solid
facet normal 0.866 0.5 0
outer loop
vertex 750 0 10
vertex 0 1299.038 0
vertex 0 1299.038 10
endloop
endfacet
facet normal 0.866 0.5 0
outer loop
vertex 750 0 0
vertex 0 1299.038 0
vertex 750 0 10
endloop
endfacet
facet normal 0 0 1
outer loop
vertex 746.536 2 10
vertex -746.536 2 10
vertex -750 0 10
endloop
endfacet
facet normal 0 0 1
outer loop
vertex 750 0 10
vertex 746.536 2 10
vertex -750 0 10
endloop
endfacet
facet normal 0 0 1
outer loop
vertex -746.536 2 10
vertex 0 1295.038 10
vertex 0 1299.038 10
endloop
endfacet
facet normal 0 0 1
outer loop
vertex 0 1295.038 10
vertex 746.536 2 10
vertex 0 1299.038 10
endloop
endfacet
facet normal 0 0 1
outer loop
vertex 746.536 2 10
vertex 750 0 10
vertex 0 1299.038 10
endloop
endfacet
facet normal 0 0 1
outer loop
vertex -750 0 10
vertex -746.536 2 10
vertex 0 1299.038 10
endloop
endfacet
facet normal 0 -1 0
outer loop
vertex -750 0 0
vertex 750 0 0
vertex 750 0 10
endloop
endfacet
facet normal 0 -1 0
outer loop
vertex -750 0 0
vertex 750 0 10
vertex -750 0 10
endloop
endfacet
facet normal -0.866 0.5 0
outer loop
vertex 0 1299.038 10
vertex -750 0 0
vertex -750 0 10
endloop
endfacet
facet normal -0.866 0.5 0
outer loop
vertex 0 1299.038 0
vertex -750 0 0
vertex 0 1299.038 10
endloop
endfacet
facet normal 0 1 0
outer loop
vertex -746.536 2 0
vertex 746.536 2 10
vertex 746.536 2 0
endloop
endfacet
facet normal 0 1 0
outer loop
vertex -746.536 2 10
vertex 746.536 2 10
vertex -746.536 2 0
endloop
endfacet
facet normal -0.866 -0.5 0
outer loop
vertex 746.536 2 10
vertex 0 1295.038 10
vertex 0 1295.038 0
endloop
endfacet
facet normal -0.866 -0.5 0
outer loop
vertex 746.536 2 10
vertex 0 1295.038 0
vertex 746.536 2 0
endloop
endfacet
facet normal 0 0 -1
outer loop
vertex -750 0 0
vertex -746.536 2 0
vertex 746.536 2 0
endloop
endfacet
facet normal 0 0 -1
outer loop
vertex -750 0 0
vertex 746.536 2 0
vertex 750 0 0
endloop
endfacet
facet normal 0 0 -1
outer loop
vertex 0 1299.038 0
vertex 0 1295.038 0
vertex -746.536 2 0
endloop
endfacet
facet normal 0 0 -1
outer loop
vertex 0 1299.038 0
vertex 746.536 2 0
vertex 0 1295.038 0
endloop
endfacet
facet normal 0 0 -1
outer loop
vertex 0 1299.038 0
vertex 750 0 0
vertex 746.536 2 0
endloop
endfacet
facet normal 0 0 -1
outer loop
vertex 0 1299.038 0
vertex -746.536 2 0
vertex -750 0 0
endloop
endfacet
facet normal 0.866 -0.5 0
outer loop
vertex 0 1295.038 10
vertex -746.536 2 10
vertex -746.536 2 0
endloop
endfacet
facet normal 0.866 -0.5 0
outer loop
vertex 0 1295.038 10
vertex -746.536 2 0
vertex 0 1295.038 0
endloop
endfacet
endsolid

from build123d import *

# Parameters (mm, degrees)
BOSS_EXTRU_1_DEPTH      = 10
ENL_V_MAT_EXTRU_1_DEPTH = 10


with BuildPart() as part:
    # Esquisse1 → Boss.-Extru.1 (new body)
    with BuildSketch(Plane.XY):
        Polygon((-750, 0), (0, 1299.038105677), (750, 0), align=None)
    extrude(amount=BOSS_EXTRU_1_DEPTH)

    # Esquisse2 → Enlèv. mat.-Extru.1 (cut)
    with BuildSketch(Plane.XY.offset(10)):
        Polygon((-746.535898385, 2), (0, 1295.038105677), (746.535898385, 2), align=None)
    extrude(amount=-ENL_V_MAT_EXTRU_1_DEPTH, mode=Mode.SUBTRACT)


solid = part.part
